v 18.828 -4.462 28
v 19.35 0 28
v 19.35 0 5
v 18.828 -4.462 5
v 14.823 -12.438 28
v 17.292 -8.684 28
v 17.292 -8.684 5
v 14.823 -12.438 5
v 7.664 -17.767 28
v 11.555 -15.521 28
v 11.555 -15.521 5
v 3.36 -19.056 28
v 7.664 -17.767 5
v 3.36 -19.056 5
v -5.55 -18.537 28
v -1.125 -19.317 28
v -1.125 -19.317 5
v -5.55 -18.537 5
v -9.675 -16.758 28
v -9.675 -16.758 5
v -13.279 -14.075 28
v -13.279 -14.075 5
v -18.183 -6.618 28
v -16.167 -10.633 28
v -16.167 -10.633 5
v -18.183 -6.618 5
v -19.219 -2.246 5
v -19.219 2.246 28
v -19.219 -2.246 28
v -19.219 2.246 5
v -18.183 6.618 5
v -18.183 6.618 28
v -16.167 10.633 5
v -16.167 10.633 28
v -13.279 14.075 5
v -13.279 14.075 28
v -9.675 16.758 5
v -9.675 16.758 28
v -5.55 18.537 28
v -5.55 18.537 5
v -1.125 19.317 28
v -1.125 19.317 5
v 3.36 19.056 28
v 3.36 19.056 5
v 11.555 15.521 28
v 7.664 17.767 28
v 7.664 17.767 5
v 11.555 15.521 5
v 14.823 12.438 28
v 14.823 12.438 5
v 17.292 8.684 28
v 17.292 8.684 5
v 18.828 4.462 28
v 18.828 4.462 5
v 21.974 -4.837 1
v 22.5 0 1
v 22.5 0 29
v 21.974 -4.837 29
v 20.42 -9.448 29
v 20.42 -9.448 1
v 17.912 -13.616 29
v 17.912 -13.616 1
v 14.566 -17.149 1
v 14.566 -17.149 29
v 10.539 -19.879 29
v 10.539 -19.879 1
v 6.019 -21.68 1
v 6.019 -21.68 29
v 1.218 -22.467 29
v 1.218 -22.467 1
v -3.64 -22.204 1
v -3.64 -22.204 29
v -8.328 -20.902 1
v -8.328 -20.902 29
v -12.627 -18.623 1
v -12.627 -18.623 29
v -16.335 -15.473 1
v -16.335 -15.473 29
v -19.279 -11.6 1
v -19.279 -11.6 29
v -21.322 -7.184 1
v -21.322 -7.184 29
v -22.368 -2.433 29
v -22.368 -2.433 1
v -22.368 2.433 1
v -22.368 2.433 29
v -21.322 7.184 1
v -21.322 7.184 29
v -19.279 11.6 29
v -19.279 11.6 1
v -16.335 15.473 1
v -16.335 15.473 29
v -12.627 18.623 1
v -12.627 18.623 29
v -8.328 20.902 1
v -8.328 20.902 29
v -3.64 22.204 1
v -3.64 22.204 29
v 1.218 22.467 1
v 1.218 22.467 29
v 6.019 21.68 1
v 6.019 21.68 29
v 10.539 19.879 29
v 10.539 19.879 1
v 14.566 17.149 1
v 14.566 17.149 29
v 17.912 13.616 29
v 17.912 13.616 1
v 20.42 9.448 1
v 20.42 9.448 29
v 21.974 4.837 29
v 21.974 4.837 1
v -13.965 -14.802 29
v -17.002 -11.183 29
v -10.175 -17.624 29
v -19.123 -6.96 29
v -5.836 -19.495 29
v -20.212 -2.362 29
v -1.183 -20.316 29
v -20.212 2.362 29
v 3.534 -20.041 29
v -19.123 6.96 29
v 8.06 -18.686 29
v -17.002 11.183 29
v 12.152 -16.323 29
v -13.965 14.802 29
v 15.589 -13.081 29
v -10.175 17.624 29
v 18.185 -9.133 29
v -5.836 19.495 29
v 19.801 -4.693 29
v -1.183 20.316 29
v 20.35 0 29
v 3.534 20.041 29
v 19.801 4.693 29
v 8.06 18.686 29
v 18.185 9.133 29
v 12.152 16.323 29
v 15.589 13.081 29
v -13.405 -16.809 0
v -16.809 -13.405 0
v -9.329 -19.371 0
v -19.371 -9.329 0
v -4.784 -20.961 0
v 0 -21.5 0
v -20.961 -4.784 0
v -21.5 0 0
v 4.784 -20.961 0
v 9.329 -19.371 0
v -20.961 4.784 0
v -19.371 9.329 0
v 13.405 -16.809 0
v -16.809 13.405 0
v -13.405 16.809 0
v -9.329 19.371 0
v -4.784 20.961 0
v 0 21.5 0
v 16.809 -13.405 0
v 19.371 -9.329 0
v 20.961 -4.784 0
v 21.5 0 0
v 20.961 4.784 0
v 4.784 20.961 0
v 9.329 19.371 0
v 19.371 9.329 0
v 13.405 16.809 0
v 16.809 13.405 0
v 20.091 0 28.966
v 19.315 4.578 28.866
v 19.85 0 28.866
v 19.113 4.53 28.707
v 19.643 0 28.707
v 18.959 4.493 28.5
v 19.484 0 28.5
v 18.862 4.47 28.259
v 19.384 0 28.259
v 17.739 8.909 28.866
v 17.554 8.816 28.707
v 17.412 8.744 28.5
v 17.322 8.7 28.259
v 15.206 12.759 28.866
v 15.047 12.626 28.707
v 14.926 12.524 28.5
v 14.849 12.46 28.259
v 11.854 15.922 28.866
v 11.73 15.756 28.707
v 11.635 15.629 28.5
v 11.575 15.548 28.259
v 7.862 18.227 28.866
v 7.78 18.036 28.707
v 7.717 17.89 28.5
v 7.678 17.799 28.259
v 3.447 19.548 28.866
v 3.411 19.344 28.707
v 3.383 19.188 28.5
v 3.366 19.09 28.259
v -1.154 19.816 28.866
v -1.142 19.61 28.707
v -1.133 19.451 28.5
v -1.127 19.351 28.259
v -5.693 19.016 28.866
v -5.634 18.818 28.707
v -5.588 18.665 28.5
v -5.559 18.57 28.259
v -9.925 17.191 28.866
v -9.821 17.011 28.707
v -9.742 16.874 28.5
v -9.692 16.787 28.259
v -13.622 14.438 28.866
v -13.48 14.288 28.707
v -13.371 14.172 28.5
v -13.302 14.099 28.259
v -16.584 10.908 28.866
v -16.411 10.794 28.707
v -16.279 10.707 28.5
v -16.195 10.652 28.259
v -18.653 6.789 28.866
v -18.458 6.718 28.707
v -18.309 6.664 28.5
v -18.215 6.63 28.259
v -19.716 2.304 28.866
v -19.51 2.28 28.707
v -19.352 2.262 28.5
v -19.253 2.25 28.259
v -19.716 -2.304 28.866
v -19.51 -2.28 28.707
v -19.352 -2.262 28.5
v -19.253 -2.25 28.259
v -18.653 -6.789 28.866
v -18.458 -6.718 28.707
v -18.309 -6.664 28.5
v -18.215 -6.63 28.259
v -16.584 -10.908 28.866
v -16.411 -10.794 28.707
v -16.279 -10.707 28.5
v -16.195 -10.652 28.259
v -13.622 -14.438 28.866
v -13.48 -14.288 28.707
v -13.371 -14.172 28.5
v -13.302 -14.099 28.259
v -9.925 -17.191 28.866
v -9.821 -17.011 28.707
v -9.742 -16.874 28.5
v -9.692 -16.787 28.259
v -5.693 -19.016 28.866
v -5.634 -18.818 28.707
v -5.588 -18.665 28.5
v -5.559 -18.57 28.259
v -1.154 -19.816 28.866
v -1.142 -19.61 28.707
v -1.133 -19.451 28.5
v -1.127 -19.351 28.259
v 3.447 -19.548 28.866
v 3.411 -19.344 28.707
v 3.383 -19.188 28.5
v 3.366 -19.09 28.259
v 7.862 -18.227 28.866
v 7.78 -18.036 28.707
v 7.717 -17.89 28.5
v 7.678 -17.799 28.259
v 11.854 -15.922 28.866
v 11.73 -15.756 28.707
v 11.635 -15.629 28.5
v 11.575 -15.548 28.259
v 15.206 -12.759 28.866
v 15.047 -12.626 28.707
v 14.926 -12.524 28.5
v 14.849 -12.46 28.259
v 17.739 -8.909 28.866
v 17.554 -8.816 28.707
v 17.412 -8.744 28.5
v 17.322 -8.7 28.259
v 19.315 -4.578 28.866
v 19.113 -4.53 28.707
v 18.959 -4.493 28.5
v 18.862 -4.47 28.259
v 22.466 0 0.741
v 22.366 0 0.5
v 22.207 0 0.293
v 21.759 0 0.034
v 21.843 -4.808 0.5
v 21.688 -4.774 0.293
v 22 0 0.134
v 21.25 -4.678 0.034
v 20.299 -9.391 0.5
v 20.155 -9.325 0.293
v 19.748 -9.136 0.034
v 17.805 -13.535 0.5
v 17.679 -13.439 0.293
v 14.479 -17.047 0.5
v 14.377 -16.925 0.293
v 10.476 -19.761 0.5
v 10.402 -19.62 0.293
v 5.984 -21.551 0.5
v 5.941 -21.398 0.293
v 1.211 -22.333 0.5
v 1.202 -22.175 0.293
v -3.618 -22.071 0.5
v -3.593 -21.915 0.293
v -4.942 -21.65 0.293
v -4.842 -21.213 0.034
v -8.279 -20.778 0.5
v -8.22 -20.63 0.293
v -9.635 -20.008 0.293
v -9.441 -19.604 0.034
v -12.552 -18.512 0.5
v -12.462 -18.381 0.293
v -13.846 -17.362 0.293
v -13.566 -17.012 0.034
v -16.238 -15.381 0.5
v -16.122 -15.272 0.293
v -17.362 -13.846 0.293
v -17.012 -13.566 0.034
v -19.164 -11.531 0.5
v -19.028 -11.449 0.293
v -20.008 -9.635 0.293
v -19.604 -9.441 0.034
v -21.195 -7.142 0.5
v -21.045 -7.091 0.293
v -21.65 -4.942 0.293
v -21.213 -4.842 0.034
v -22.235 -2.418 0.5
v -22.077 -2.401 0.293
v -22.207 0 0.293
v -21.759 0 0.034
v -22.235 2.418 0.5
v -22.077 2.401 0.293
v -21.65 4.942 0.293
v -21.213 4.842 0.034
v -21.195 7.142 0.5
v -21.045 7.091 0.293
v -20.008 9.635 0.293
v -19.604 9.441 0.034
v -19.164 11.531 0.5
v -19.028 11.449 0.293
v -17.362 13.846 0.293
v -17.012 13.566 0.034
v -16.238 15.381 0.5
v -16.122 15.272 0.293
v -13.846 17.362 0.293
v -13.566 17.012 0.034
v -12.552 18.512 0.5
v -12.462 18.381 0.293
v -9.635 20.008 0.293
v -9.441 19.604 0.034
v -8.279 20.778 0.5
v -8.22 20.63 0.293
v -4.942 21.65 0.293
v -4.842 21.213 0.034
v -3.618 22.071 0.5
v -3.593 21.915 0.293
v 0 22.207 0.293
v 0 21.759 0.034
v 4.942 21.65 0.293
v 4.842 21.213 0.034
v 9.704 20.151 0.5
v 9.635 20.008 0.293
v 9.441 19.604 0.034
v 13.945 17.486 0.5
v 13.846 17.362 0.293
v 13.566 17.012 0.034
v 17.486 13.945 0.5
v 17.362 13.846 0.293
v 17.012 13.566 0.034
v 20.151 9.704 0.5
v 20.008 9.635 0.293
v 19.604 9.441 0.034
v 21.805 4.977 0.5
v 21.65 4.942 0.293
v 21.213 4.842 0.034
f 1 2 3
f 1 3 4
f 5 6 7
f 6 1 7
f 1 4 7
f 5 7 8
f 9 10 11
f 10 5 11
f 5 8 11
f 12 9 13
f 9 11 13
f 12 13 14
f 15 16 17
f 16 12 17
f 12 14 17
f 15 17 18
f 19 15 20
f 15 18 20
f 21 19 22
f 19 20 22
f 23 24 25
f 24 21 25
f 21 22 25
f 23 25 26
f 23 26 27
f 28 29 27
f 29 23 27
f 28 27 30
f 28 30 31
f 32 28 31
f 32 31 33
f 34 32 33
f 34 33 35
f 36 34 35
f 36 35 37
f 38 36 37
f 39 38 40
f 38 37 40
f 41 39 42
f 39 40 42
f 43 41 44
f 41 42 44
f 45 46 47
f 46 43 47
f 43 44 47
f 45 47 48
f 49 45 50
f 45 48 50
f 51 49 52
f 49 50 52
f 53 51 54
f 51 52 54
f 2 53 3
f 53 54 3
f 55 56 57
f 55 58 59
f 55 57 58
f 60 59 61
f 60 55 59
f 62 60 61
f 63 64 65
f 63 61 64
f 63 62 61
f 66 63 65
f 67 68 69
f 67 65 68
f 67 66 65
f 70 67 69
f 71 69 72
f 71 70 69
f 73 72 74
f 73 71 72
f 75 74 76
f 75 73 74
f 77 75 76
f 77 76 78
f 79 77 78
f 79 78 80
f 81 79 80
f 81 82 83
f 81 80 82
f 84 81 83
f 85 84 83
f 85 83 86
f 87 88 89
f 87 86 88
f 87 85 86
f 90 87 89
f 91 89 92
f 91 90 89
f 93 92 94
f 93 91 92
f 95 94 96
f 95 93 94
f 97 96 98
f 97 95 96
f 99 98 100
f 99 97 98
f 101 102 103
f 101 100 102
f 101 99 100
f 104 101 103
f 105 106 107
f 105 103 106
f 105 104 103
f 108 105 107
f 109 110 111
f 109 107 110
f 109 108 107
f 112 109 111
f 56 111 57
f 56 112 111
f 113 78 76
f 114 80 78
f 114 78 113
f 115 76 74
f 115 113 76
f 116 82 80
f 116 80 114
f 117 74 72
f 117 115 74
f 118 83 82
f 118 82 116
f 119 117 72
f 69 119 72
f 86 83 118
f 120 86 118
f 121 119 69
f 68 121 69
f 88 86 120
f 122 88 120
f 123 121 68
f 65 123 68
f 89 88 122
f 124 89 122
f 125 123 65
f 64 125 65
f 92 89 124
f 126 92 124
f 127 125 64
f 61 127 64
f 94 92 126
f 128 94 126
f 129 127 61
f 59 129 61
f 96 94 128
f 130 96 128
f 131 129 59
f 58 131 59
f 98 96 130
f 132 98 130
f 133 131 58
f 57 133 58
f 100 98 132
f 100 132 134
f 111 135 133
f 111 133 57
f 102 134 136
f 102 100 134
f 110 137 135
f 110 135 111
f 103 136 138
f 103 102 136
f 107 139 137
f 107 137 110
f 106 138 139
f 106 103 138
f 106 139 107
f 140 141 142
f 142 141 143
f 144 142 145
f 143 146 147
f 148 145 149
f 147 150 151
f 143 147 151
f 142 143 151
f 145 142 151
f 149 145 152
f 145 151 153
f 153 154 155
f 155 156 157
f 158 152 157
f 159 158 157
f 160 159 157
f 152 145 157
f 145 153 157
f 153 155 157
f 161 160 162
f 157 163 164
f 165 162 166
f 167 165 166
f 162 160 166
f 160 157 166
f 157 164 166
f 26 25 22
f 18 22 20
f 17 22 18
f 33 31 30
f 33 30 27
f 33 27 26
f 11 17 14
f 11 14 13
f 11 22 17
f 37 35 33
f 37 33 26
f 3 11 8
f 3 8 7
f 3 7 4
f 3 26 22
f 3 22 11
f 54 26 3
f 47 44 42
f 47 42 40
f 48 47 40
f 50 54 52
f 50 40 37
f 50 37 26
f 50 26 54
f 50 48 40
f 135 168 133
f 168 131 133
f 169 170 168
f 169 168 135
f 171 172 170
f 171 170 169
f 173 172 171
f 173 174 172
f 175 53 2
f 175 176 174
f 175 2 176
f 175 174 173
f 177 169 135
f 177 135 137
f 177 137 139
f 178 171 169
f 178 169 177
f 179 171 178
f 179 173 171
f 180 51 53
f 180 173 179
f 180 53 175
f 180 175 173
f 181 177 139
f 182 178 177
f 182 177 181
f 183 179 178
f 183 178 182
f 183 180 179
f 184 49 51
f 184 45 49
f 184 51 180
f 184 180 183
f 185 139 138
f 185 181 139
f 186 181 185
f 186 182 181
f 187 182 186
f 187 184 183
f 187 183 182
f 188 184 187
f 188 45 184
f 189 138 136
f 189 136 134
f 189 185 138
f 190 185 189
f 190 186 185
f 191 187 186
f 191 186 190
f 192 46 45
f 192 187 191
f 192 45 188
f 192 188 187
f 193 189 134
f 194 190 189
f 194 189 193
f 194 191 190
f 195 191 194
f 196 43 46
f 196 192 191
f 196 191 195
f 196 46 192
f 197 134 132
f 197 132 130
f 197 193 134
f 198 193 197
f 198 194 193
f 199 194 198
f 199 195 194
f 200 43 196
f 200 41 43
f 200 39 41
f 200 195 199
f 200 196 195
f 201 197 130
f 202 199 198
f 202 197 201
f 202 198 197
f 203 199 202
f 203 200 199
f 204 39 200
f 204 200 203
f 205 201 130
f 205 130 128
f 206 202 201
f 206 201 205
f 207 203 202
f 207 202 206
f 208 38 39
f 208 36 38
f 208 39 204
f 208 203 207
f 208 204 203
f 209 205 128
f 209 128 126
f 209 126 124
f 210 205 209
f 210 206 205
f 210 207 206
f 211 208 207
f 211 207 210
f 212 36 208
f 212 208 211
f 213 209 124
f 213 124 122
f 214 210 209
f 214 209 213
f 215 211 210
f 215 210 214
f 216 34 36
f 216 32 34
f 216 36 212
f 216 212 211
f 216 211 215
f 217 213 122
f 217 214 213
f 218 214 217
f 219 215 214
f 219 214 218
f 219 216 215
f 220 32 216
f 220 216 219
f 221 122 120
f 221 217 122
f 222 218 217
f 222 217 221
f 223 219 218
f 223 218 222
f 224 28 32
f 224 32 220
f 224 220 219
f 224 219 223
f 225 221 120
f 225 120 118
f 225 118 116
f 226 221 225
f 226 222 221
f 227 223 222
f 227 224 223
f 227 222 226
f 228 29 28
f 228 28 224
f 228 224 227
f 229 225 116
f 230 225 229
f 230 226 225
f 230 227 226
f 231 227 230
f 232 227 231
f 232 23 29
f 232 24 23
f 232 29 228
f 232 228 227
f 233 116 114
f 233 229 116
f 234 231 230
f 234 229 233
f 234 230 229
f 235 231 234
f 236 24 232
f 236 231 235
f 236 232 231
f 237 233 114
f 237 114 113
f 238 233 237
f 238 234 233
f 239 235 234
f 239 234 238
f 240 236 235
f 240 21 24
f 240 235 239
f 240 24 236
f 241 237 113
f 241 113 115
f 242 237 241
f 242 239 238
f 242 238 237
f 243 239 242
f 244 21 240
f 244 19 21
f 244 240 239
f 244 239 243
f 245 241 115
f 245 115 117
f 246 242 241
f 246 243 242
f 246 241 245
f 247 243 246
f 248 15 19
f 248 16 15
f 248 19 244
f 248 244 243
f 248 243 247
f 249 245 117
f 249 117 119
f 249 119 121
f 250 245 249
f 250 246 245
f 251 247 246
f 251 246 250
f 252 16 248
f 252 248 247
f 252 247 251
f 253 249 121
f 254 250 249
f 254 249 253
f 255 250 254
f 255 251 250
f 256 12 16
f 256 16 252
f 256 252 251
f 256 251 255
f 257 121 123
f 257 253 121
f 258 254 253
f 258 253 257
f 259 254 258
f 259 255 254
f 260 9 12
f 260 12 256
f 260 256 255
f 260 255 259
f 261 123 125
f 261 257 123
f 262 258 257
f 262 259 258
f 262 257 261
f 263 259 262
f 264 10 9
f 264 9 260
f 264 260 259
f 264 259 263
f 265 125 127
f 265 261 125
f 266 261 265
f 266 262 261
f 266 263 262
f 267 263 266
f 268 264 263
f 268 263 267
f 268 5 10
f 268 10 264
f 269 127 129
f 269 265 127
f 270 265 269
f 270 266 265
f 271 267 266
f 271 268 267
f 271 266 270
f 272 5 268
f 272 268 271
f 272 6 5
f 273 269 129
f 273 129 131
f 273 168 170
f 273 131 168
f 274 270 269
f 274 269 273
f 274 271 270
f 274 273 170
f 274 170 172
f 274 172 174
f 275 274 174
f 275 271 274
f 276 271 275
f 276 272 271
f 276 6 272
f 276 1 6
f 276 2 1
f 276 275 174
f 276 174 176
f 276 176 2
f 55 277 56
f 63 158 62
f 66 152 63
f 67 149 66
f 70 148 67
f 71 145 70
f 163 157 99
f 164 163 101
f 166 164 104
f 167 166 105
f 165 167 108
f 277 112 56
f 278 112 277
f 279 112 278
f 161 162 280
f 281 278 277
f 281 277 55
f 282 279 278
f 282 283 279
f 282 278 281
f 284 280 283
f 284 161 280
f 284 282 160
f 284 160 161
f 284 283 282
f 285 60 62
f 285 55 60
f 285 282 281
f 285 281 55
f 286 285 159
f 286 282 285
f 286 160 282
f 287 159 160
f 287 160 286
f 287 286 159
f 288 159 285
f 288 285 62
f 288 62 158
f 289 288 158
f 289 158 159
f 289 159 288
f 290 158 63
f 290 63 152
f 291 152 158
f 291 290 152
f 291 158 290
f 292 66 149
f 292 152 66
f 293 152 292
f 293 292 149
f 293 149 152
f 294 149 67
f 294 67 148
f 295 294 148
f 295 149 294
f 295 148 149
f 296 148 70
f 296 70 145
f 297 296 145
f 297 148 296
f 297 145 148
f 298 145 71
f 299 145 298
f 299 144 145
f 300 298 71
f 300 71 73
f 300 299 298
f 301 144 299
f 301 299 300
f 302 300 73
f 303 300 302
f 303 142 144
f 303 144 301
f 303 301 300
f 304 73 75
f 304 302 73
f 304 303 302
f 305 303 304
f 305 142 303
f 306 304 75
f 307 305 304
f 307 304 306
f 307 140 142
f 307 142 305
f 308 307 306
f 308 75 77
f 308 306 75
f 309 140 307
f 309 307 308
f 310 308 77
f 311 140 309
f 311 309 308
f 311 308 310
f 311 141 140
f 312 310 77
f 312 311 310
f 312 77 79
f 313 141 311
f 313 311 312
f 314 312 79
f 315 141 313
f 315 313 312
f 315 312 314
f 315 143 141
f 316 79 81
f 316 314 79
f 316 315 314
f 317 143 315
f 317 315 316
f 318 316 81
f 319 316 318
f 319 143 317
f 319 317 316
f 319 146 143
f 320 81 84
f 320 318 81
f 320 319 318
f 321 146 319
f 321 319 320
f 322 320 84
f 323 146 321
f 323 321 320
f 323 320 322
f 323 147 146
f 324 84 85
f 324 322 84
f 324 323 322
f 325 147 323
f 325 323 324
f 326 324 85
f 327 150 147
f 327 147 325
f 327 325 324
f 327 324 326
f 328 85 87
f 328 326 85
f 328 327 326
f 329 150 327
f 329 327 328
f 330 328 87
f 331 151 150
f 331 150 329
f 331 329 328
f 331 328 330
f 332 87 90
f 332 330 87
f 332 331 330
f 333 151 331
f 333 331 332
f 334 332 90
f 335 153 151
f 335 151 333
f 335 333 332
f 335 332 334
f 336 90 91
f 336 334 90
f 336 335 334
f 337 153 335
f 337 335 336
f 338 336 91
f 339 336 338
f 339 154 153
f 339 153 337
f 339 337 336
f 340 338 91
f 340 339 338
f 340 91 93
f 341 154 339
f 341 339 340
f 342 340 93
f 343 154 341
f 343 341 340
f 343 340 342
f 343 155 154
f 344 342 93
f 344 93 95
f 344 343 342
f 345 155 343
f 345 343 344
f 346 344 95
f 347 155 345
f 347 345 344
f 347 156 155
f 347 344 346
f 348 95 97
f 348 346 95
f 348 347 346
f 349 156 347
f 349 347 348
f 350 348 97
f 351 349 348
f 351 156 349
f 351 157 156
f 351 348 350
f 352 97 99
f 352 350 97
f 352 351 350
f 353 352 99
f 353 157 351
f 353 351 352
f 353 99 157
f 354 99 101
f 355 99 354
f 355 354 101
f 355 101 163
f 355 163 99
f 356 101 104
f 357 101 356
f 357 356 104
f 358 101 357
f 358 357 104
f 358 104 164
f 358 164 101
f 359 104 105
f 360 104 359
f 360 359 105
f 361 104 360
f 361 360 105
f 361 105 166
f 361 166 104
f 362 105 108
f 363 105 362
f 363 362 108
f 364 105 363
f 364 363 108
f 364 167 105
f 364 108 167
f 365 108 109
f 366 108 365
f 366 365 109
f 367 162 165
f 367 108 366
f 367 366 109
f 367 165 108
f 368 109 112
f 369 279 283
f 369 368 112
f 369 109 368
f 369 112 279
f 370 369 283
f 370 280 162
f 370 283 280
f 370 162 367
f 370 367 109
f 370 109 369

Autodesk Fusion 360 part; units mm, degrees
sketch "Sketch1" plane through (0, 0, 0) normal (0, 0, 1) x (1, 0, 0)
  circle A0 centre (0, 0) radius 22.5
  circle A1 centre (0, 0) radius 19.35
  dimension "d1" = 45
  dimension "d2" = 38.7
extrude "Extrude1" add sketch "Sketch1" along normal blind 5 contours A1
extrude "Extrude2" add sketch "Sketch1" along normal blind 29
fillet "Fillet1" radius 1 1 edges at (-18.0405, 6.9973, 29)
fillet "Fillet2" radius 1 1 edges at (-20.9774, -8.1363, 0)
